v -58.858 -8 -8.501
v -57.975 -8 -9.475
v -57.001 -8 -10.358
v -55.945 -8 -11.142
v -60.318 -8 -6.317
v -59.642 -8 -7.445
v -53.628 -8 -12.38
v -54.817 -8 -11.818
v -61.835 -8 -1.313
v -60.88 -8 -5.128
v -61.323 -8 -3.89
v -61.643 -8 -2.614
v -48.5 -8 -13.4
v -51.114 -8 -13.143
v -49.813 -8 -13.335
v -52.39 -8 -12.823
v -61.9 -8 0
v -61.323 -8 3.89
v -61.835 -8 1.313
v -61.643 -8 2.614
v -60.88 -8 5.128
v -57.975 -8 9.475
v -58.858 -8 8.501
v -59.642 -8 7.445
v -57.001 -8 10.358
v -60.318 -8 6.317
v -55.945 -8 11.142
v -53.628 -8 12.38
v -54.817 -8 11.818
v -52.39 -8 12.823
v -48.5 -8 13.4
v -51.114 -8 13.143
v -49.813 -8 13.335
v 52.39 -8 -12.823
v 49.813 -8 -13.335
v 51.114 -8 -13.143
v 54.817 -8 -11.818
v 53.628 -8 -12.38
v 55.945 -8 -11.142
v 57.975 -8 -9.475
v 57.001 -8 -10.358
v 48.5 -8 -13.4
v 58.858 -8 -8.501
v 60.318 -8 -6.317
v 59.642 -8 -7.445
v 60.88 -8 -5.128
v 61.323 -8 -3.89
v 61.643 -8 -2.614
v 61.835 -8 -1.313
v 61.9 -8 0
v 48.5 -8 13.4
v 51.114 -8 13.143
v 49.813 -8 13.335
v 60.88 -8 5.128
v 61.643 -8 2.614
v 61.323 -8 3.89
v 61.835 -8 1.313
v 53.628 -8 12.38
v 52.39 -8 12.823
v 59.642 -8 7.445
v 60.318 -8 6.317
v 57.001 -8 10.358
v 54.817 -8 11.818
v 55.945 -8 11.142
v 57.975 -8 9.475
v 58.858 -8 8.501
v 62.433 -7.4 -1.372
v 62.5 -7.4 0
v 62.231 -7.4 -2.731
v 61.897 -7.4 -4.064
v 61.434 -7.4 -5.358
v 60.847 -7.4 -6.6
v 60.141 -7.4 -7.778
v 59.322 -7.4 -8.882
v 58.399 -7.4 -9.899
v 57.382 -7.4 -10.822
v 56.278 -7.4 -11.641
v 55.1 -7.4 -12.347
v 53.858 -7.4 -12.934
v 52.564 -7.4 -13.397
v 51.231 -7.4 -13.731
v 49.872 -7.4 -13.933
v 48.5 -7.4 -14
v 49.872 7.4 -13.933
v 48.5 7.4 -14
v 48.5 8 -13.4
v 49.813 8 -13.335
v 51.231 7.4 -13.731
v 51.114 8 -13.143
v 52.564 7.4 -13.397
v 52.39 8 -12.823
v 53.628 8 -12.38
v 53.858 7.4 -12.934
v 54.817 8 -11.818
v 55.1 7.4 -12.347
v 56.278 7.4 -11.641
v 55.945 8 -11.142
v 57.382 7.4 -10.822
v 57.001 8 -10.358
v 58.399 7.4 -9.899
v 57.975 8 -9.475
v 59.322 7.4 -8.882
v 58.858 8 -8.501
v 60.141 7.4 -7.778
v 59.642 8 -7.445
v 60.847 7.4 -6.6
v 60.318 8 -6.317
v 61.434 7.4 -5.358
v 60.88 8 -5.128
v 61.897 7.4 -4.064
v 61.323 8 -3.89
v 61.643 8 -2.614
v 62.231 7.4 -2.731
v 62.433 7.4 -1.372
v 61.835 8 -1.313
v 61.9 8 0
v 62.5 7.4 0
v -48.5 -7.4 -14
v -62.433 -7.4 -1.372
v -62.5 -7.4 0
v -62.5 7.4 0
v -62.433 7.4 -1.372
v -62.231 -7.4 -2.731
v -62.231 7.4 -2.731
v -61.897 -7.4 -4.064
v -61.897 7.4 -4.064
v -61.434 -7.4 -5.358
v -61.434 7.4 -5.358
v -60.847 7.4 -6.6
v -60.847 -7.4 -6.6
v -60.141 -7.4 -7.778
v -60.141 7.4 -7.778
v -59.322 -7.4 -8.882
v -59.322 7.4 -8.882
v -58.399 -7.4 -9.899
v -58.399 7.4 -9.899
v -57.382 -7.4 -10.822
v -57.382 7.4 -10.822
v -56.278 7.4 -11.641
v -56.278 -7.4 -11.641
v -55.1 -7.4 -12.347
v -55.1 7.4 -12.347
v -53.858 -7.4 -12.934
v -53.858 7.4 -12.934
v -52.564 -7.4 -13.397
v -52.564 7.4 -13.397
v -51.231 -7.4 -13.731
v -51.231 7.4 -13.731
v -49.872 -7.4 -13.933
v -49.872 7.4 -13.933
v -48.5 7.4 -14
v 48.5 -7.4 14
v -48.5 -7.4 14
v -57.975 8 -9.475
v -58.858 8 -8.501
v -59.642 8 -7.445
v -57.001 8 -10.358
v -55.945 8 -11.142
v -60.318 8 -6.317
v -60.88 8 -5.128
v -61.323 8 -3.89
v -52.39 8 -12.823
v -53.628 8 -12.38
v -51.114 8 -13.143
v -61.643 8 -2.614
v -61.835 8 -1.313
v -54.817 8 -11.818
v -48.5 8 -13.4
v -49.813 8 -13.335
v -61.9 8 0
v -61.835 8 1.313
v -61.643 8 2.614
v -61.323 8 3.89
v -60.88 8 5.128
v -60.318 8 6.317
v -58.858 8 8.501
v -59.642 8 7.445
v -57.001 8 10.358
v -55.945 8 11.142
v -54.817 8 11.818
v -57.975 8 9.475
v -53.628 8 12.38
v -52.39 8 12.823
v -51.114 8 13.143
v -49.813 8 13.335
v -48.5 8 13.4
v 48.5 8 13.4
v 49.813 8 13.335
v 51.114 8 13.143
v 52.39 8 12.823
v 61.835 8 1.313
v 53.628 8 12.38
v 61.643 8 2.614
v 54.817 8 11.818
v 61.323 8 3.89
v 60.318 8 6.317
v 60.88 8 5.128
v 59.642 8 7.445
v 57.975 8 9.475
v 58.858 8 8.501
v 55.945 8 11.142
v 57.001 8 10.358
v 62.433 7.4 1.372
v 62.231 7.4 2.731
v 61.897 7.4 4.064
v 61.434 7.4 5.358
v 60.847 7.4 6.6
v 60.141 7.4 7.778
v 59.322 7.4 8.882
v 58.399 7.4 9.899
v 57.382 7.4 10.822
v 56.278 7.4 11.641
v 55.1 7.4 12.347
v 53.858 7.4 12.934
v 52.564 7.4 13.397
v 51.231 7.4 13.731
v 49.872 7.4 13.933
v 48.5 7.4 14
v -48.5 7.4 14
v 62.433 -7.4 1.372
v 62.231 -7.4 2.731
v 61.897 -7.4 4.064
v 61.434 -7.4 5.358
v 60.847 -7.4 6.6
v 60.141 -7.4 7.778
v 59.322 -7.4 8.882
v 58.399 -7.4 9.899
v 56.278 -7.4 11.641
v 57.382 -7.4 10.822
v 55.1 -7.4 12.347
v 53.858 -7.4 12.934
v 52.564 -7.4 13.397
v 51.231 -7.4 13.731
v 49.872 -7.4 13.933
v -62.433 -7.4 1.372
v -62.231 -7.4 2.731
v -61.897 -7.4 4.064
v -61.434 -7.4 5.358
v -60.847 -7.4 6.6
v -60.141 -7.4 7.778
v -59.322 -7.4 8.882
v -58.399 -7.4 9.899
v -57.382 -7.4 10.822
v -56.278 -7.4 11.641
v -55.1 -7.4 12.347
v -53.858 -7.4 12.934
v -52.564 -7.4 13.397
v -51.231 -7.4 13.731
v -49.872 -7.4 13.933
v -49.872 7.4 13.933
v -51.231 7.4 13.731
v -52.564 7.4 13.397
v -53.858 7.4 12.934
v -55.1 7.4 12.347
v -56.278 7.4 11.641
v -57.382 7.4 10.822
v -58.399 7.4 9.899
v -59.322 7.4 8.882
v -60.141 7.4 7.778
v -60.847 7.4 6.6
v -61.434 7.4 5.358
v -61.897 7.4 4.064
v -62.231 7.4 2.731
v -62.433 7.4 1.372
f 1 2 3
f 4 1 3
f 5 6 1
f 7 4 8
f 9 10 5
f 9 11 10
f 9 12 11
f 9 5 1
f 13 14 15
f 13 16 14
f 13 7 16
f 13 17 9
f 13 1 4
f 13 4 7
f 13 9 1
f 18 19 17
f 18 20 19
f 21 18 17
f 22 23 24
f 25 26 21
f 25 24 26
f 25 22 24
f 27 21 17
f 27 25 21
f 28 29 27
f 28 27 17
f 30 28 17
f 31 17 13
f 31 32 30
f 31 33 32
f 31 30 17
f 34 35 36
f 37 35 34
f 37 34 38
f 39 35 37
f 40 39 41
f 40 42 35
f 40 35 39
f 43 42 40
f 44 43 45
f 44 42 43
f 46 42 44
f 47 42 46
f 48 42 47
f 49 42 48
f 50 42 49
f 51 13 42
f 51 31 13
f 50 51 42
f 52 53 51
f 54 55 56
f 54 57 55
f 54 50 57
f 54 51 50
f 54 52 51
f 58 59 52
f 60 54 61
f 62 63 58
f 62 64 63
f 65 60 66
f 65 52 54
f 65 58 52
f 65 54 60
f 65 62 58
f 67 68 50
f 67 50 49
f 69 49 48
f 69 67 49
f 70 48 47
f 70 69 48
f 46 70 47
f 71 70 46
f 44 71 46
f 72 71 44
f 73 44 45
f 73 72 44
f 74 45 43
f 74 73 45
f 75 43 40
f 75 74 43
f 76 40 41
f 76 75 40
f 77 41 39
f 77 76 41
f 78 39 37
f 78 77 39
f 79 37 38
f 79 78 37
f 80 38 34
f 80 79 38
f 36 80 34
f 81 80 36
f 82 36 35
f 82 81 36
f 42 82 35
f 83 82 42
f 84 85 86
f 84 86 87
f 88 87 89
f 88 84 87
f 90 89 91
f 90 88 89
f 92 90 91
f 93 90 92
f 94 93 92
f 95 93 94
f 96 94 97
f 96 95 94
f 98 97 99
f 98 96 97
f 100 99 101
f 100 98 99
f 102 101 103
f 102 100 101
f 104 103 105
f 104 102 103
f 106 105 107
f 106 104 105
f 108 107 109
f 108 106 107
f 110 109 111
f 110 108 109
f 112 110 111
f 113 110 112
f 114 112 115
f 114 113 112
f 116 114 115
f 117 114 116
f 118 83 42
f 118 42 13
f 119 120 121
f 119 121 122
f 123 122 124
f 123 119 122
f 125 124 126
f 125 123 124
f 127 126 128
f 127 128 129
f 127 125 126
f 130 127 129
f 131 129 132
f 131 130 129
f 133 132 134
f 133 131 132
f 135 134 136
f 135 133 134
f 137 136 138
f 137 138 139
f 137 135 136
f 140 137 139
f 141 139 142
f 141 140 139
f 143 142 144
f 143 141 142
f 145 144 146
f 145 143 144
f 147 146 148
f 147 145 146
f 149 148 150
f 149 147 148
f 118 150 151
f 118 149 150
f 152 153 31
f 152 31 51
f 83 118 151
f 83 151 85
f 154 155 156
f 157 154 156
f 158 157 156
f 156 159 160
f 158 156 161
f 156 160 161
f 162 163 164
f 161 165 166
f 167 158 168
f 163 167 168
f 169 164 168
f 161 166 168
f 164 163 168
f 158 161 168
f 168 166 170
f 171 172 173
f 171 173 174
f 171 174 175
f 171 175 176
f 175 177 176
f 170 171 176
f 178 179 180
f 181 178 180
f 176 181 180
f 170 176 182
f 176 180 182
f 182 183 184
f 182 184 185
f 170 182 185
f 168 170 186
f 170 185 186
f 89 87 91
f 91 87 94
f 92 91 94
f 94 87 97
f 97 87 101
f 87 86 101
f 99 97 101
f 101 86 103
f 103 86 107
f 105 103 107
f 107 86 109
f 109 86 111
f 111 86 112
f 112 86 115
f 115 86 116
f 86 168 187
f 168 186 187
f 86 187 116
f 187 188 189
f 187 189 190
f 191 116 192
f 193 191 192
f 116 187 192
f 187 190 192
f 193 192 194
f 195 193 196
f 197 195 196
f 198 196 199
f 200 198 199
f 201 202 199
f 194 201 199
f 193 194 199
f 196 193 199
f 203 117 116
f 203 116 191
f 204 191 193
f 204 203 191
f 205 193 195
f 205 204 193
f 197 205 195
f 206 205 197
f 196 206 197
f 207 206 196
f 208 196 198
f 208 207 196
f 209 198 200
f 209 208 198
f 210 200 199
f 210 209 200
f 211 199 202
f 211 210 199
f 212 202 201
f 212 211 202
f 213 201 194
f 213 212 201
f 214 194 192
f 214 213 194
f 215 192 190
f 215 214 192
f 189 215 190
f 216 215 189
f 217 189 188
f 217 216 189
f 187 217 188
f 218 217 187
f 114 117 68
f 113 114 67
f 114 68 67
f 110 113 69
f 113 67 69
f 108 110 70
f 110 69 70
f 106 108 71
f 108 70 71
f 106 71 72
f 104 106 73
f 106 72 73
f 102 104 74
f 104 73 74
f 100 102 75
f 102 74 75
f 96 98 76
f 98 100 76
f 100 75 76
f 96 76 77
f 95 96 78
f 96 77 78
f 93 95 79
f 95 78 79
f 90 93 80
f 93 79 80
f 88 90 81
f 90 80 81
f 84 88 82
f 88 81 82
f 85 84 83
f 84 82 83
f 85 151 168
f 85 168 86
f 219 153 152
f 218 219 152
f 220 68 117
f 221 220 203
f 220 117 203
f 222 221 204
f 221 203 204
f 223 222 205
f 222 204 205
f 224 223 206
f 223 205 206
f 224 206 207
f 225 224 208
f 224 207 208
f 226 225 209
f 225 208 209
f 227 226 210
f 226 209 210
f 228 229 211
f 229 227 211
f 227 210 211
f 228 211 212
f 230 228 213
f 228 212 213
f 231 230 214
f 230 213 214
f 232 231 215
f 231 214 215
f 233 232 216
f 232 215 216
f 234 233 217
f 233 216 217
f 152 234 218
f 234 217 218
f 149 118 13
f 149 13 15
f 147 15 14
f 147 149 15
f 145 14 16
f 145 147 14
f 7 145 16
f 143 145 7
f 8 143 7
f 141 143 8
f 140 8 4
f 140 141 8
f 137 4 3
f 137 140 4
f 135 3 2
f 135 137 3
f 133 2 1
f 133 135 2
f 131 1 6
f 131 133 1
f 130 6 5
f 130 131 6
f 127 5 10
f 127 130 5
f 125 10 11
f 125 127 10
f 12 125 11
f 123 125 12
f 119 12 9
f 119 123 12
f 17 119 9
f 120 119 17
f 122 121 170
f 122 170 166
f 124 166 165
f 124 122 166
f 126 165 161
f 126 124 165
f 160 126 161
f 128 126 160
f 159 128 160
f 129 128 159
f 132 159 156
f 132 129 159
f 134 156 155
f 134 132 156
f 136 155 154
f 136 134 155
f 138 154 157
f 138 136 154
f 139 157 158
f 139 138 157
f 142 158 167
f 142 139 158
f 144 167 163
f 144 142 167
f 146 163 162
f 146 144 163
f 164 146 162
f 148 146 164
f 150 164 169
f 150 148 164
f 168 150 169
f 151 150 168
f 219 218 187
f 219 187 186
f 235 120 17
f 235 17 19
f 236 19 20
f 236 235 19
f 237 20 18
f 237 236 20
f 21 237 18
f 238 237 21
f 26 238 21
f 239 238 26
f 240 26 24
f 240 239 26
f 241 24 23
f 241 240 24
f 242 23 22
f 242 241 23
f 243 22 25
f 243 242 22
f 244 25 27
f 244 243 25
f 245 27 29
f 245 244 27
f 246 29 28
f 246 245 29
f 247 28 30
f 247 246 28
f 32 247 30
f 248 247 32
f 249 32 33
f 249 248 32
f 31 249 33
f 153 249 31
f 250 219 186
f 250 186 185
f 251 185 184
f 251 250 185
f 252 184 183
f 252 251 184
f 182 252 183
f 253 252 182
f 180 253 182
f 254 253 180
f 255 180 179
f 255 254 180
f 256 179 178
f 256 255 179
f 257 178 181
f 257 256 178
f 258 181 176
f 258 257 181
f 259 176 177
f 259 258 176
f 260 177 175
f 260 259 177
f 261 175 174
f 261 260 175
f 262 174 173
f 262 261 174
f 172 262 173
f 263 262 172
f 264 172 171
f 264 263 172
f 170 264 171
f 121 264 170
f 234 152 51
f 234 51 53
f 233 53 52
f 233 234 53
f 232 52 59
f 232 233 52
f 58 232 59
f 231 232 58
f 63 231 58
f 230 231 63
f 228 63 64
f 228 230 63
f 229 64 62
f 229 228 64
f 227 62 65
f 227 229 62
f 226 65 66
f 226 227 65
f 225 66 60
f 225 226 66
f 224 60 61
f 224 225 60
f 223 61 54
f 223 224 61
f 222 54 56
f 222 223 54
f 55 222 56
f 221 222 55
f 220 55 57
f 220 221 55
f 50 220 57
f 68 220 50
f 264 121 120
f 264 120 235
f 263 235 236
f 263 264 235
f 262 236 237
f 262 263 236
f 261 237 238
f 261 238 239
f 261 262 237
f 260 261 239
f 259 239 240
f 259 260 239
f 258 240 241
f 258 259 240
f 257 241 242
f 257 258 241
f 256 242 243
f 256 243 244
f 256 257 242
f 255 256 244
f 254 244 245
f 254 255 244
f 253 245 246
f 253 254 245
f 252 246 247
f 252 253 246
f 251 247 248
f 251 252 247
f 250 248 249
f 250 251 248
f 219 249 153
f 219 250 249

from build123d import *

# Parameters (mm, degrees)
F0_W     = 125
F0_H     = 28
F1_DEPTH = 8
F2_R     = 13.99999
F3_SIZE  = 0.6


# Not quite as in the source:
# - a fillet or chamfer is up to 0.001 mm smaller than in the source, because OpenCascade refuses the exact size


with BuildPart() as f1:
    # F0 (on Front) → F1 (new body, symmetric)
    with BuildSketch(Plane.XZ):
        Rectangle(F0_W, F0_H)
    extrude(amount=F1_DEPTH, both=True)

    # F2 (radius 14 in the source; OpenCascade refuses exactly that, so slightly less here)
    f2_edges = [f1.edges().sort_by_distance(p)[0] for p in [
        (62.5, 0, -14),
        (62.5, 0, 14),
        (-62.5, 0, -14),
        (-62.5, 0, 14),
    ]]
    fillet(f2_edges, radius=F2_R)

    # F3
    f3_edges = [f1.edges().sort_by_distance(p)[0] for p in [
        (0, -8, 14),
        (62.5, -8, 0),
        (58.399498, -8, -9.899498),
        (58.399498, -8, 9.899498),
        (0, -8, -14),
        (-58.399498, -8, -9.899498),
        (-58.399498, -8, 9.899498),
        (-62.5, -8, 0),
        (62.5, 8, 0),
        (58.399498, 8, -9.899498),
        (58.399498, 8, 9.899498),
        (0, 8, -14),
        (0, 8, 14),
        (-58.399498, 8, -9.899498),
        (-58.399498, 8, 9.899498),
        (-62.5, 8, 0),
    ]]
    chamfer(f3_edges, length=F3_SIZE)


solid = f1.part
